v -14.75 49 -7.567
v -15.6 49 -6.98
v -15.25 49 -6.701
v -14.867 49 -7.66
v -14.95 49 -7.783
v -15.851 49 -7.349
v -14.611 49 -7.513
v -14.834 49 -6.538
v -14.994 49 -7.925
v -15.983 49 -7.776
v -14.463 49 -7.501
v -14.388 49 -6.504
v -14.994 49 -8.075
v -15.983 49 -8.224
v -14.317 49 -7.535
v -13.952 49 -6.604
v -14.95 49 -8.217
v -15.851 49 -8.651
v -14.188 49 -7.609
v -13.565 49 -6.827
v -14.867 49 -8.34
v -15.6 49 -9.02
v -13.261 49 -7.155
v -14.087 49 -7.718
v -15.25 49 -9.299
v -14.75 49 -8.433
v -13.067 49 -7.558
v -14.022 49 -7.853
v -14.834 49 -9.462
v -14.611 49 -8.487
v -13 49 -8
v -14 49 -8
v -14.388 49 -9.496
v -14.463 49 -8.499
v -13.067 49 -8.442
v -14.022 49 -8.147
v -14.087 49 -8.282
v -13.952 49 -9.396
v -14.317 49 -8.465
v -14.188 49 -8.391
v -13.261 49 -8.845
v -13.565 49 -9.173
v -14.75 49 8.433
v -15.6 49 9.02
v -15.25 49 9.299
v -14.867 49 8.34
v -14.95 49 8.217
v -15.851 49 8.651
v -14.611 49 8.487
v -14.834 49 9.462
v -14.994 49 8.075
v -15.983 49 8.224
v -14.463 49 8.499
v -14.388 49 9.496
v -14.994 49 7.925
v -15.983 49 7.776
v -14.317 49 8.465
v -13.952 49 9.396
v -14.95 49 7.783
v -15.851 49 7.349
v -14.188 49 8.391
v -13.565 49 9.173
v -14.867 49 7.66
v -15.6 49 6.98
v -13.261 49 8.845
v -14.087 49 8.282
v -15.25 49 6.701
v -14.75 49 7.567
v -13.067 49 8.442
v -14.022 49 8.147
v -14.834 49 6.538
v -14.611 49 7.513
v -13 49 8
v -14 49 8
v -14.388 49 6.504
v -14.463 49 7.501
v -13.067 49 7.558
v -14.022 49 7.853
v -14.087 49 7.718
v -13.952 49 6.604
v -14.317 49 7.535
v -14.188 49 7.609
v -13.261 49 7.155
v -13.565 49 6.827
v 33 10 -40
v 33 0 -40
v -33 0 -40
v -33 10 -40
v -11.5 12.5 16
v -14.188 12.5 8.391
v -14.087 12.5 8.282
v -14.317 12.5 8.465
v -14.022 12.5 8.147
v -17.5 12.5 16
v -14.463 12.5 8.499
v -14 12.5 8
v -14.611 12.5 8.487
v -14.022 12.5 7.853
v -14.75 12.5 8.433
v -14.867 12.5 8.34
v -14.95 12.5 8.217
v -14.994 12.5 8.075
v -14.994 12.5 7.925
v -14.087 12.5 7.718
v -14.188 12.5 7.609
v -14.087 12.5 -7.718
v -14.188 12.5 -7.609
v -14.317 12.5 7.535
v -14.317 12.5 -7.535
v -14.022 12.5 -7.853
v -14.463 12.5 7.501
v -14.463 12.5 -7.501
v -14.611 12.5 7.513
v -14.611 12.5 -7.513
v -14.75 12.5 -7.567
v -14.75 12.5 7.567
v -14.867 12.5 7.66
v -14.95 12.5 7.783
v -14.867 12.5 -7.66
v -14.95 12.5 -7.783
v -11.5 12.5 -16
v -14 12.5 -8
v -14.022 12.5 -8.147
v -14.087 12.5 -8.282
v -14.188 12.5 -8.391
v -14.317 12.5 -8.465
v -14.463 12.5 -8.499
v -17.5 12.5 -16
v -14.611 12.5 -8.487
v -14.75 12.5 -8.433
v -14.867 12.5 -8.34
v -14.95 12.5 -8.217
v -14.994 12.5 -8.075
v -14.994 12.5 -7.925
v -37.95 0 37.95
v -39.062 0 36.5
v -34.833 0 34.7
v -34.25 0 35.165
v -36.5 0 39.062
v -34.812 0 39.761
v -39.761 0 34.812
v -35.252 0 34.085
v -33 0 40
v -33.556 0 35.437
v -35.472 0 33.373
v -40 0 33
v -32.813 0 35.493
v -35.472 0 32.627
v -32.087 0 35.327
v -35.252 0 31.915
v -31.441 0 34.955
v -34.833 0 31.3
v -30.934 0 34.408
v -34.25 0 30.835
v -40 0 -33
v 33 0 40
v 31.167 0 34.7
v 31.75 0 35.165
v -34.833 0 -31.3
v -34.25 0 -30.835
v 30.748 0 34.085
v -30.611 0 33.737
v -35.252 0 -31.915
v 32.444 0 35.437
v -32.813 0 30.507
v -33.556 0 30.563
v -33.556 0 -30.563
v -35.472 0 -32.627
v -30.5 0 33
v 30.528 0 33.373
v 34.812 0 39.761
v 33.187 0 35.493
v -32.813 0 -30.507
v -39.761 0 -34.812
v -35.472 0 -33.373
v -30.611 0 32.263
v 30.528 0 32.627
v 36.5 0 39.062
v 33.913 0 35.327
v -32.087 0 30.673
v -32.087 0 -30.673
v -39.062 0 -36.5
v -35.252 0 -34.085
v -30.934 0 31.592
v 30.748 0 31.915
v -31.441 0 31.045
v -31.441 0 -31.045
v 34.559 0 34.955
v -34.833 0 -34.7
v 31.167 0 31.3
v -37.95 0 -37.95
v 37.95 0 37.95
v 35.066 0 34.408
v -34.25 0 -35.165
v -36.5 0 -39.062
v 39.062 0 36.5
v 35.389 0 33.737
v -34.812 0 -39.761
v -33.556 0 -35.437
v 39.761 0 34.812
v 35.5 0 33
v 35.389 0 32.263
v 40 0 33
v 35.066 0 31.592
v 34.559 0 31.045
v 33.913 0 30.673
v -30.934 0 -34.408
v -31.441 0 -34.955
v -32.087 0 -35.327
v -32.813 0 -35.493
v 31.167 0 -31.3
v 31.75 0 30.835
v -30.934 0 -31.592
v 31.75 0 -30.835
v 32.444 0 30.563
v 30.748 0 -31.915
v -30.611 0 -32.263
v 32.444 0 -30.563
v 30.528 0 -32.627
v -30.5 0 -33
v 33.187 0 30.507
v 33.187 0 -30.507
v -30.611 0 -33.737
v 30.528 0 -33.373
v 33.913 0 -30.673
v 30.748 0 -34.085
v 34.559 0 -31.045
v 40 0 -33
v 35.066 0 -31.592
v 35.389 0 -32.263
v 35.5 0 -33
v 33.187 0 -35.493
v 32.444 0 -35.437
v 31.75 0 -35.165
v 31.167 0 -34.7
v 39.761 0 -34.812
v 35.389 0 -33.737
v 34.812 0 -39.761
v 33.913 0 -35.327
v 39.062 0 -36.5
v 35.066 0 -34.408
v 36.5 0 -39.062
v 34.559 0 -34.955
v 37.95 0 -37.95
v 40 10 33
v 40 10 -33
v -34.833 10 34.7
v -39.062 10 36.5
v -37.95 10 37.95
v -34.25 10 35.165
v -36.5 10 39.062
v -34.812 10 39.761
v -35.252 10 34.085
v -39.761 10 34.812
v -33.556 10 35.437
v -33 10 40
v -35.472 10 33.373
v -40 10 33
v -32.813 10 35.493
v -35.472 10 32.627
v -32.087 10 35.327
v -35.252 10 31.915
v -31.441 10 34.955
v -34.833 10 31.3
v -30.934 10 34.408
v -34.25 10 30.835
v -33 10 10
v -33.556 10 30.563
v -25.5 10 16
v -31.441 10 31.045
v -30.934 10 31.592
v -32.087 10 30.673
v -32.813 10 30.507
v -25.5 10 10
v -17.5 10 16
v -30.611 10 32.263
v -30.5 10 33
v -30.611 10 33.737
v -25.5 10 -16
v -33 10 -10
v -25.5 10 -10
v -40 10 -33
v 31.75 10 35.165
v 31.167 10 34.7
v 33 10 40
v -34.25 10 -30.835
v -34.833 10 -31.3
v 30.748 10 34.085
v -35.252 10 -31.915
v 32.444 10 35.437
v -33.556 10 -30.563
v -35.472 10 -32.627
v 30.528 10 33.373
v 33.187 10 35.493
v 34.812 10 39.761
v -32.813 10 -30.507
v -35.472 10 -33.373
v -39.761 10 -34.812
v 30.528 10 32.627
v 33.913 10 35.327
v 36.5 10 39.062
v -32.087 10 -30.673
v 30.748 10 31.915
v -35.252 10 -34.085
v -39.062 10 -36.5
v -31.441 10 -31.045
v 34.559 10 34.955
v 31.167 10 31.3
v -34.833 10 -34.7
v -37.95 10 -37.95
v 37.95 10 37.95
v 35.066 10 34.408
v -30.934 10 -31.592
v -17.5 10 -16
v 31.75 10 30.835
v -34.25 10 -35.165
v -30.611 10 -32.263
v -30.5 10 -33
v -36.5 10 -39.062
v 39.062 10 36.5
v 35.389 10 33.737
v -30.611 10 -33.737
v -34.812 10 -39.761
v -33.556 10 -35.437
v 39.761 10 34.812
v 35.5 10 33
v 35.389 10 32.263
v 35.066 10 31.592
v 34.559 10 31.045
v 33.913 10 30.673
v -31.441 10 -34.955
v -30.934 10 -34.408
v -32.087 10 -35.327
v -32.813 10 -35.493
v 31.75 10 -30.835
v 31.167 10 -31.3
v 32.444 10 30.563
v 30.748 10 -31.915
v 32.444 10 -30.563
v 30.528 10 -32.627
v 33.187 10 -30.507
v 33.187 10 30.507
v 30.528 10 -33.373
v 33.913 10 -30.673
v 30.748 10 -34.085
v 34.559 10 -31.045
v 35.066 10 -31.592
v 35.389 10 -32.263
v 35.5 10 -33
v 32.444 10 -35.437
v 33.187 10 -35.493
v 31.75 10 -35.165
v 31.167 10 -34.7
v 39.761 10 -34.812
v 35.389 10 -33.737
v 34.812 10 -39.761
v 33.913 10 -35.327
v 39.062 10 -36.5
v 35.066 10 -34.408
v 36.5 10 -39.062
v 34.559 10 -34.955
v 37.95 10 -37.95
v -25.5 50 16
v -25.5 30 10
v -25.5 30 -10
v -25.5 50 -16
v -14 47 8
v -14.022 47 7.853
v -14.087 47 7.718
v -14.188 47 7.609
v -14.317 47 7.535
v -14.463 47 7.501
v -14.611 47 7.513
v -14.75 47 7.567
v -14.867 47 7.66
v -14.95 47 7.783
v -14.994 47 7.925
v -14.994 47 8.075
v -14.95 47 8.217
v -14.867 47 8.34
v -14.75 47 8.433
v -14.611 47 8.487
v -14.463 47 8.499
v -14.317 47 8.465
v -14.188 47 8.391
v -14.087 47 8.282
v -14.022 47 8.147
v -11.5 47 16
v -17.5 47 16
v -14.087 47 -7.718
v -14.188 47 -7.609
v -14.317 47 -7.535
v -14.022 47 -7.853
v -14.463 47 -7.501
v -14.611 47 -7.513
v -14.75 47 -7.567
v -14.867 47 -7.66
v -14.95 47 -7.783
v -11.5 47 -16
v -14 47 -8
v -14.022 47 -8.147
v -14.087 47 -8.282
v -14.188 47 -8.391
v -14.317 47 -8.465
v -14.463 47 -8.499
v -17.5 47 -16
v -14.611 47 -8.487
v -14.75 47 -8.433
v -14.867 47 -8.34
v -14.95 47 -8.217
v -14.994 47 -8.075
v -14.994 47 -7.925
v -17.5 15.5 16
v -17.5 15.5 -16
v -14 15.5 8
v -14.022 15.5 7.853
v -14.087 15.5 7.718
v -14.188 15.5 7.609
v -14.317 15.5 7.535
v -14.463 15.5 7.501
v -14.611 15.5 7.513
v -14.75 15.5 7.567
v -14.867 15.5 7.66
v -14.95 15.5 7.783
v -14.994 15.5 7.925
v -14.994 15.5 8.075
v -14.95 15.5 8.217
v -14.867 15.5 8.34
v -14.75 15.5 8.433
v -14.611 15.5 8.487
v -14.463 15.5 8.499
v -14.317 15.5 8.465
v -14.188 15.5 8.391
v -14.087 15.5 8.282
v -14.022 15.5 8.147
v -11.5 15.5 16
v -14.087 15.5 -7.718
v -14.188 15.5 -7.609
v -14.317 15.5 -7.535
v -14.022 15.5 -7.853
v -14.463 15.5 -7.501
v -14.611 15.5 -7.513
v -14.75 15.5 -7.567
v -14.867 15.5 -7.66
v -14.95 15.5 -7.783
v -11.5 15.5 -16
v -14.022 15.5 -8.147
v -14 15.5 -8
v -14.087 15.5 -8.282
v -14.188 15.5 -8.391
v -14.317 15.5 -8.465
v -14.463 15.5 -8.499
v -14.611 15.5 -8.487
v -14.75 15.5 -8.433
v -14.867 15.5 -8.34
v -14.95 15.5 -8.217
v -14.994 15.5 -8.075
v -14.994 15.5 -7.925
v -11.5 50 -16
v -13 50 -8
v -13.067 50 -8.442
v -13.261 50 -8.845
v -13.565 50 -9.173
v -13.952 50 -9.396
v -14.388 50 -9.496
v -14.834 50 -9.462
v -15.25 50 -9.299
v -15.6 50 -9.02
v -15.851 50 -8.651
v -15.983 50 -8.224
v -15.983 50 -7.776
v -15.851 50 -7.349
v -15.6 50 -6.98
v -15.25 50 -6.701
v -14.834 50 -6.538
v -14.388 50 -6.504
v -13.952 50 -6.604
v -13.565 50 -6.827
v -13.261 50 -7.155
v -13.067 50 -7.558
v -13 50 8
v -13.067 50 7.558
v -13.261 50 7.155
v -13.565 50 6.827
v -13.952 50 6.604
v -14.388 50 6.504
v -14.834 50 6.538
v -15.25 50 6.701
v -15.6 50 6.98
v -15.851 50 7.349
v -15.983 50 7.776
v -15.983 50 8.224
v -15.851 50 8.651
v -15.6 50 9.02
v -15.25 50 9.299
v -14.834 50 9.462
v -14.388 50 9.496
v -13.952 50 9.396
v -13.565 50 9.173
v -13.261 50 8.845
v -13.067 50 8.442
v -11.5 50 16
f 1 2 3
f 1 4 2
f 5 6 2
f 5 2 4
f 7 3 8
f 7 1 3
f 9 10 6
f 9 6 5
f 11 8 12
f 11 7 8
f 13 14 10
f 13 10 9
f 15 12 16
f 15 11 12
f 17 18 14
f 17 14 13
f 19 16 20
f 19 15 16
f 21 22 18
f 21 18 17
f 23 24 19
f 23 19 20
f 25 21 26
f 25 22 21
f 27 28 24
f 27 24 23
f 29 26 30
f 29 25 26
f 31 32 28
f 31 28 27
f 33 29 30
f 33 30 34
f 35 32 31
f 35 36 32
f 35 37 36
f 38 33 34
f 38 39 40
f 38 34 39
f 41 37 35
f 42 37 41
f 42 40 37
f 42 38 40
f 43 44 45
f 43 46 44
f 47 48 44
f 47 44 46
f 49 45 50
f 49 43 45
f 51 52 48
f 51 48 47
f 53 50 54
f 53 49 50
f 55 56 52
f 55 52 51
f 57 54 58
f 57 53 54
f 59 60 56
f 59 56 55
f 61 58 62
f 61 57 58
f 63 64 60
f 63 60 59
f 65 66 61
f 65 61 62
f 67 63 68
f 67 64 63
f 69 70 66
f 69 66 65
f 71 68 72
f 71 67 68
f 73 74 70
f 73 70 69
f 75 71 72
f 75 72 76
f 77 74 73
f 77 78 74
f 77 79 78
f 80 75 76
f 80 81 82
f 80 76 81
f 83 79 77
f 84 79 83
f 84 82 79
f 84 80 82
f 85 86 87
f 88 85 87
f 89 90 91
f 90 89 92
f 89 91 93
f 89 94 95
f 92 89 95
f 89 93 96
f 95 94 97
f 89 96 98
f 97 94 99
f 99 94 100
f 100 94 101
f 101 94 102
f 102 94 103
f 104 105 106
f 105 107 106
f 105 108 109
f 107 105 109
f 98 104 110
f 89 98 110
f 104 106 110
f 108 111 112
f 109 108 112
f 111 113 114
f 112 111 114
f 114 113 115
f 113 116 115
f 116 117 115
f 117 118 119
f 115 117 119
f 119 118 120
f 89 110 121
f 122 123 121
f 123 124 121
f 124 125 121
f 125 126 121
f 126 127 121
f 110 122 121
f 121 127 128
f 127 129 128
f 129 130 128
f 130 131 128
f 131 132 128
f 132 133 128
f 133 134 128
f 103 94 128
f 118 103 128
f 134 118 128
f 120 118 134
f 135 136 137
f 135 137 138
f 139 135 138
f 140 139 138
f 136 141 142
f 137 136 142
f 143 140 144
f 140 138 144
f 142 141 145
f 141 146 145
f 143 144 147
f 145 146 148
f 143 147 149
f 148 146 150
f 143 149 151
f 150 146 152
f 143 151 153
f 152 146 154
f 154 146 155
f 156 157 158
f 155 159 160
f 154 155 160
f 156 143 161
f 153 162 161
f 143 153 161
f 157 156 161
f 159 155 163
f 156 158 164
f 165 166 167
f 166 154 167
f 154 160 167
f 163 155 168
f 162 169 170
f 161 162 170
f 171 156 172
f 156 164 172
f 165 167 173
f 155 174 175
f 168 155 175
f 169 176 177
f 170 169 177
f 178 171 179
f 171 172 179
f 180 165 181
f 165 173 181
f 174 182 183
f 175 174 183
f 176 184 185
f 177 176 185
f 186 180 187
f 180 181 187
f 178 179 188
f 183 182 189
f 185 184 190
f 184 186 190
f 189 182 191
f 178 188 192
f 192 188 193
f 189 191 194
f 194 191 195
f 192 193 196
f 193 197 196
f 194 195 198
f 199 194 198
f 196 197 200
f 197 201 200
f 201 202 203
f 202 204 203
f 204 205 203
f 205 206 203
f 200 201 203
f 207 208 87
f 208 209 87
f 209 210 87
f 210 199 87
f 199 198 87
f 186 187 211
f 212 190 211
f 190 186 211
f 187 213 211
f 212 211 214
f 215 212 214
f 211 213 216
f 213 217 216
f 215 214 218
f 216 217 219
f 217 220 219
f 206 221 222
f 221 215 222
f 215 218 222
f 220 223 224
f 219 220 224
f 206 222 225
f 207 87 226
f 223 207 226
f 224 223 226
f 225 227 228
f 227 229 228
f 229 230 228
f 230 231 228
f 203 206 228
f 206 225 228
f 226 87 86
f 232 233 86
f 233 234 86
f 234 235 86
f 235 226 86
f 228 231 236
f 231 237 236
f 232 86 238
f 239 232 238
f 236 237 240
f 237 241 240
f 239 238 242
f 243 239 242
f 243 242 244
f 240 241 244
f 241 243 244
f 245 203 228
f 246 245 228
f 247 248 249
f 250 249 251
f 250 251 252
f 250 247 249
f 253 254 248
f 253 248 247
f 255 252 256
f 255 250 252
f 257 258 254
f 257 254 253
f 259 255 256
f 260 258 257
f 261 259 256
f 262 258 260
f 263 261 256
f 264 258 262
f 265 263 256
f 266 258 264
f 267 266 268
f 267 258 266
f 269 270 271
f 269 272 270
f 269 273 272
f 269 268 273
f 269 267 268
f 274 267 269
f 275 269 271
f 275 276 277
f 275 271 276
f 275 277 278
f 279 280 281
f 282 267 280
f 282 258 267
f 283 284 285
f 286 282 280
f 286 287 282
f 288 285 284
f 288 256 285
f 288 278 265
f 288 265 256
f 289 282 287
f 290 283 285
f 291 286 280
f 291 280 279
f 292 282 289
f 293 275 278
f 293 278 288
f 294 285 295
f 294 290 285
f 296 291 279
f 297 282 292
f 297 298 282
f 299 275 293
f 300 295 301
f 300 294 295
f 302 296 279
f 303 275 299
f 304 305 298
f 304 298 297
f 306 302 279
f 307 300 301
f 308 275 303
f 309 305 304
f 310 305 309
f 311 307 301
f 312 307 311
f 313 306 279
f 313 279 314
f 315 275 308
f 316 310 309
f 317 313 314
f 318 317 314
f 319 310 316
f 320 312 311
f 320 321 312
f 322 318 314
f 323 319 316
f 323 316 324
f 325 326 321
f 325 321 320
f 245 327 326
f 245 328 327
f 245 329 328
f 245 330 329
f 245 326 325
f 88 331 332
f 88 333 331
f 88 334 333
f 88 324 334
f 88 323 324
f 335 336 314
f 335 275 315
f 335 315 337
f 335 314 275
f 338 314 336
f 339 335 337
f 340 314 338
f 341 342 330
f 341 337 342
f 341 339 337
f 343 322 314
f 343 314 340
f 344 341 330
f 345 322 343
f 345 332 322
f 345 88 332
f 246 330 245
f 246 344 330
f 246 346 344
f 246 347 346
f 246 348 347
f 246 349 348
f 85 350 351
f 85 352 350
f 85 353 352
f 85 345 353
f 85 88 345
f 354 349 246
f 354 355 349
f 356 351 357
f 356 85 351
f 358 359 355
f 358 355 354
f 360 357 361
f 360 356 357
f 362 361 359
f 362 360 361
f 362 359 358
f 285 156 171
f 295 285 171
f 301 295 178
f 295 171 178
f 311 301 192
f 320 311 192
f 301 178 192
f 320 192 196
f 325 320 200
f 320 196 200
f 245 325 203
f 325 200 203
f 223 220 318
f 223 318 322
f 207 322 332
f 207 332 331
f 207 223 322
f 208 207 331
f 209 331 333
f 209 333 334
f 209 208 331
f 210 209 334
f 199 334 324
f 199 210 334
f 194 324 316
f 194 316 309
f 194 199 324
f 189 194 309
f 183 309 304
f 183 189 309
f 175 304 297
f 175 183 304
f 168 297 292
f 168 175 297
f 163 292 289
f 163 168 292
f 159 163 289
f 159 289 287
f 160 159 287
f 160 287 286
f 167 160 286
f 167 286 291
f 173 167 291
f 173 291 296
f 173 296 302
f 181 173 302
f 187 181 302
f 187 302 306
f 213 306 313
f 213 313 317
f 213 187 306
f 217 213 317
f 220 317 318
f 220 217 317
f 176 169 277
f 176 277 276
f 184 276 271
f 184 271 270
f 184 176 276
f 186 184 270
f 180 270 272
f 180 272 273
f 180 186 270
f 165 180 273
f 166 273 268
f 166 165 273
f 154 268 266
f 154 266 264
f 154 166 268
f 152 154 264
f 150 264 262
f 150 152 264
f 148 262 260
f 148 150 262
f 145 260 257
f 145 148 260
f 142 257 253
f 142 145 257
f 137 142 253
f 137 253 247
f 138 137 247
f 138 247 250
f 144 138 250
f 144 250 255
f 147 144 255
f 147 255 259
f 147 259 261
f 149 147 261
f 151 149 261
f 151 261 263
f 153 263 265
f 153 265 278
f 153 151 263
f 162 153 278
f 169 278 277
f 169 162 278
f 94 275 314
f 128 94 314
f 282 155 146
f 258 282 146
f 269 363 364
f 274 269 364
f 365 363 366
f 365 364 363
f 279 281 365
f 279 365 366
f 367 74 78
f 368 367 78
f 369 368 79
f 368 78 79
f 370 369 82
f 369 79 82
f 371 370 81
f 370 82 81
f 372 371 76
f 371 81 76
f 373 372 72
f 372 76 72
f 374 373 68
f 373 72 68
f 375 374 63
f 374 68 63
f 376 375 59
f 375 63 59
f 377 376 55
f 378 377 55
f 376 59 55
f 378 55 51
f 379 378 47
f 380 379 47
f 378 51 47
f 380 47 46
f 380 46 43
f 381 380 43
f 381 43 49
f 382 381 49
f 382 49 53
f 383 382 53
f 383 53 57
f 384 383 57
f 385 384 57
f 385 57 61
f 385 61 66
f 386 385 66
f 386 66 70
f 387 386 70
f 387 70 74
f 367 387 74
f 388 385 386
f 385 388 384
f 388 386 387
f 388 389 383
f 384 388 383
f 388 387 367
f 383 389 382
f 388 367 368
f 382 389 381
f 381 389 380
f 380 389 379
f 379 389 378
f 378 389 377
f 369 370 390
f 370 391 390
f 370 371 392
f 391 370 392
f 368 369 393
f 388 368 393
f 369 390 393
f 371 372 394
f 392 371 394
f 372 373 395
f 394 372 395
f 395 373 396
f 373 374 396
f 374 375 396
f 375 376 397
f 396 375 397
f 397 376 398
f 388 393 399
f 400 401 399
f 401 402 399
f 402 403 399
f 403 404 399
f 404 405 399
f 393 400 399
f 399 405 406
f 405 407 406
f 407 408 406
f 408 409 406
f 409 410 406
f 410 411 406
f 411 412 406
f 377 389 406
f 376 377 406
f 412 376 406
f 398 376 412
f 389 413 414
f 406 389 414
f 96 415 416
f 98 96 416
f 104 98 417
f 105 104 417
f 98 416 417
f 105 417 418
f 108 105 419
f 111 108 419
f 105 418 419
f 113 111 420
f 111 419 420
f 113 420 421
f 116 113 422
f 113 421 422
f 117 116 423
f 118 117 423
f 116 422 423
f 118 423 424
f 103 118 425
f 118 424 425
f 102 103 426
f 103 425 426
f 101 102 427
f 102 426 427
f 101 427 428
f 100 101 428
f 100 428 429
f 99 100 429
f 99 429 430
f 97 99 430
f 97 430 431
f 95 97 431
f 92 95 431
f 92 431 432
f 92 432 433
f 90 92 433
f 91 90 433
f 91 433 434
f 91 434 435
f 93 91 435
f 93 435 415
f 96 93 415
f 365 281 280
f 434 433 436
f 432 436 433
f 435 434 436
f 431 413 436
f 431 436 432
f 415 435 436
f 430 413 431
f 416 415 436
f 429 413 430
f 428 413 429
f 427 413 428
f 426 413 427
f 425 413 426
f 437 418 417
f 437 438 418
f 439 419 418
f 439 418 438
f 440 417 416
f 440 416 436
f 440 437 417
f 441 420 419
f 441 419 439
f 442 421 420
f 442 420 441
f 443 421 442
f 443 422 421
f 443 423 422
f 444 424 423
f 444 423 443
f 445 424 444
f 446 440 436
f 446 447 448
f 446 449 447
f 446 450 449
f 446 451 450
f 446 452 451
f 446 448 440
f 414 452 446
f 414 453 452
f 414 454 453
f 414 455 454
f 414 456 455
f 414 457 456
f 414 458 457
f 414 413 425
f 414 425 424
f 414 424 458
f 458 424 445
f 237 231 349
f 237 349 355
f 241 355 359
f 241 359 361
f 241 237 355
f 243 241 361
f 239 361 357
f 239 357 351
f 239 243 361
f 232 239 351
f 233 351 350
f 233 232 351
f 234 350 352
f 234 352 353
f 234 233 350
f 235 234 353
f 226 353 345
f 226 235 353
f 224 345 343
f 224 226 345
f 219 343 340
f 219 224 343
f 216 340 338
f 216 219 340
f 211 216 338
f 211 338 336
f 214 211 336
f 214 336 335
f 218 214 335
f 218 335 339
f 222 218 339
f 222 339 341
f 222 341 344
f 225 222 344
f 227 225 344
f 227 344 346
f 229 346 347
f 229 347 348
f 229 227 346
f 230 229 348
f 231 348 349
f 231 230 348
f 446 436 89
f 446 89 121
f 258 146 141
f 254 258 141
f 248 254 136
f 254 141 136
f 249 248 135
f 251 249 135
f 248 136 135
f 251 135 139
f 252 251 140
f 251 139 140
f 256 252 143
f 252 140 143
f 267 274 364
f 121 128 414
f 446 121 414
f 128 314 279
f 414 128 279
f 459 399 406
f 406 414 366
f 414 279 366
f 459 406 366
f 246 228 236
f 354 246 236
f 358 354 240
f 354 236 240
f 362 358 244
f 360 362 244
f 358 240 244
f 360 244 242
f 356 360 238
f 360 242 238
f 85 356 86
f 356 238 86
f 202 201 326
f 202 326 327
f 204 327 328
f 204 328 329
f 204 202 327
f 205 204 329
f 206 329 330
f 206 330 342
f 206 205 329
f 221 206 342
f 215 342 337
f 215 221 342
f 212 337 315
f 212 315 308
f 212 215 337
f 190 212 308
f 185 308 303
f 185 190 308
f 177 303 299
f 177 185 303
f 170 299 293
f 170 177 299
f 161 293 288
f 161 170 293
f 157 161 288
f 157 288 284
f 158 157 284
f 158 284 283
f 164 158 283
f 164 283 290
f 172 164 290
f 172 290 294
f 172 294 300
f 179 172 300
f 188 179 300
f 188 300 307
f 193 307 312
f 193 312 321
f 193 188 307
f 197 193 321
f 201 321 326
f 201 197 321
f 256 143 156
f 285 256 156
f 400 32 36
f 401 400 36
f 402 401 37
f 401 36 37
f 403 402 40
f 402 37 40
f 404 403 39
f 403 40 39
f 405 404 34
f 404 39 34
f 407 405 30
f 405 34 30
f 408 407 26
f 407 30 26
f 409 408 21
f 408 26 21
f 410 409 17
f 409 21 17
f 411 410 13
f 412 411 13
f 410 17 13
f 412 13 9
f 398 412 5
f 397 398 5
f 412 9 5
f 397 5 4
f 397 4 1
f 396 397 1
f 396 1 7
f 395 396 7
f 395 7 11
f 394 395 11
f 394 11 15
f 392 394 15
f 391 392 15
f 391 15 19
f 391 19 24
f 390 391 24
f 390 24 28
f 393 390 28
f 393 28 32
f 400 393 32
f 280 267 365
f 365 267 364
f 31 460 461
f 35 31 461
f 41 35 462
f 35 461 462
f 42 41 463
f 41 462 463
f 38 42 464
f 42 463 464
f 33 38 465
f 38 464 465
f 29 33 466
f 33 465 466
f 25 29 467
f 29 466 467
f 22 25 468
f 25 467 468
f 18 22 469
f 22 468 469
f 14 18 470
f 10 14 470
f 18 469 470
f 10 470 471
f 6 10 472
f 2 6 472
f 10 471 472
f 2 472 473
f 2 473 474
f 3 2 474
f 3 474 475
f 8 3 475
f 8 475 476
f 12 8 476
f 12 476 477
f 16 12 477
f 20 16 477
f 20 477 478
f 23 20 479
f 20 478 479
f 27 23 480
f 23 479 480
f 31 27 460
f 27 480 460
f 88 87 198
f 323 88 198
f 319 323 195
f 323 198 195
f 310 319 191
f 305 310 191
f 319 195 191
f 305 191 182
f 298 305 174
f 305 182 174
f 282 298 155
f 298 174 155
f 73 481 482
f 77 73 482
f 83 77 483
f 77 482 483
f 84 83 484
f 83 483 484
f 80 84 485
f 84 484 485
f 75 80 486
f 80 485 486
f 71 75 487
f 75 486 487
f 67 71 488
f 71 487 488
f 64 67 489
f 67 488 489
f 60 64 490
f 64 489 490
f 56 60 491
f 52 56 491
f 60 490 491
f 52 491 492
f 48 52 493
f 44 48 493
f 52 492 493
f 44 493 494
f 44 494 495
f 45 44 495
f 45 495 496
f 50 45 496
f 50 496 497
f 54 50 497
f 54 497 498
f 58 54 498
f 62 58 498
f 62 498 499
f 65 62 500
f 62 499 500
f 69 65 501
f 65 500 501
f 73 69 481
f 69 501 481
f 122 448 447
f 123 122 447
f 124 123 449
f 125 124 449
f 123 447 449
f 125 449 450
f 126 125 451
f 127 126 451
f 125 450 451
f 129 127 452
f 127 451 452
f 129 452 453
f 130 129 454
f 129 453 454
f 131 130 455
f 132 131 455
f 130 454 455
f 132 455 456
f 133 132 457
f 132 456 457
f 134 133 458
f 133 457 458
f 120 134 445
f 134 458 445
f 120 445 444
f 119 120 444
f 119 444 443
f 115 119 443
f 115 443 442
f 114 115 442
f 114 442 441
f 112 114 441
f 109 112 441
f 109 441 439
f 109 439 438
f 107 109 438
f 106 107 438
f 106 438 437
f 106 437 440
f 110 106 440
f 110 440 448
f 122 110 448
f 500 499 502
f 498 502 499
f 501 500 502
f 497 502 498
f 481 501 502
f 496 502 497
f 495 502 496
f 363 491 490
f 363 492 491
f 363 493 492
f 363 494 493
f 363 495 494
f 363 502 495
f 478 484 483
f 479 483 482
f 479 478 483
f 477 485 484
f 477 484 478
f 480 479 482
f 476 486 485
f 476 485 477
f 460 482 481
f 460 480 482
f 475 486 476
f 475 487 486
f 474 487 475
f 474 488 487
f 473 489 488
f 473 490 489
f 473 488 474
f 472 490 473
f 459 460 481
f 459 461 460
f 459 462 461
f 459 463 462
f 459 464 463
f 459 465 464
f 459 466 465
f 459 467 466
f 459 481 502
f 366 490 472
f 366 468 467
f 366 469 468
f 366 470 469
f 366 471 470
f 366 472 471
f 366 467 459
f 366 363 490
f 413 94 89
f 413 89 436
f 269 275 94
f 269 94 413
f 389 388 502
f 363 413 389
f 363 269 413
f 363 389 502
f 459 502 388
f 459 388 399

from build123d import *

# Parameters (mm, degrees)
SKETCH1_R           = 2.5
BOSS_EXTRUDE1_DEPTH = 10
SKETCH5_W           = 8
SKETCH5_H           = 32
BOSS_EXTRUDE4_DEPTH = 40
BOSS_EXTRUDE5_DEPTH = 10
SKETCH7_W           = 32
SKETCH7_H           = 3
BOSS_EXTRUDE6_DEPTH = 6
SKETCH8_R           = 0.5
CUT_EXTRUDE1_DEPTH  = 39
SKETCH9_R           = 1.5
CUT_EXTRUDE2_DEPTH  = 1


with BuildPart() as part:
    # Sketch1 → Boss-Extrude1 (new body)
    with BuildSketch(Plane(origin=(0, 0, 0), x_dir=(1, 0, 0), z_dir=(0, 1, 0))):
        with BuildLine():
            Line((-33, -40), (33, -40))
            ThreePointArc((33, -40), (37.949747468, -37.949747468), (40, -33))
            Line((40, -33), (40, 33))
            ThreePointArc((40, 33), (37.949747468, 37.949747468), (33, 40))
            Line((33, 40), (-33, 40))
            ThreePointArc((-33, 40), (-37.949747468, 37.949747468), (-40, 33))
            Line((-40, 33), (-40, -33))
            ThreePointArc((-40, -33), (-37.949747468, -37.949747468), (-33, -40))
        make_face()
        with Locations((33, -33)):
            Circle(SKETCH1_R, mode=Mode.SUBTRACT)
        with Locations((-33, -33)):
            Circle(SKETCH1_R, mode=Mode.SUBTRACT)
        with Locations((33, 33)):
            Circle(SKETCH1_R, mode=Mode.SUBTRACT)
        with Locations((-33, 33)):
            Circle(SKETCH1_R, mode=Mode.SUBTRACT)
    extrude(amount=BOSS_EXTRUDE1_DEPTH)

    # Sketch5 → Boss-Extrude4 (add)
    with BuildSketch(Plane(origin=(0, 10, 0), x_dir=(1, 0, 0), z_dir=(0, 1, 0))):
        with Locations((-21.5, 0)):
            Rectangle(SKETCH5_W, SKETCH5_H)
    extrude(amount=BOSS_EXTRUDE4_DEPTH)

    # Sketch6 → Boss-Extrude5 (add, symmetric)
    with BuildSketch(Plane.XY):
        Polygon((-33, 10), (-25.5, 30), (-25.5, 10), align=None)
    extrude(amount=BOSS_EXTRUDE5_DEPTH, both=True)

    # Sketch7 → Boss-Extrude6 (add)
    with BuildSketch(Plane(origin=(-17.5, 0, 0), x_dir=(0, 0, -1), z_dir=(1, 0, 0))):
        with Locations((0, 48.5)):
            Rectangle(SKETCH7_W, SKETCH7_H)
        with Locations((0, 14)):
            Rectangle(SKETCH7_W, SKETCH7_H)
    extrude(amount=BOSS_EXTRUDE6_DEPTH)

    # Sketch8 → Cut-Extrude1 (cut)
    with BuildSketch(Plane(origin=(0, 50, 0), x_dir=(1, 0, 0), z_dir=(0, 1, 0))):
        with Locations((-14.5, -8)):
            Circle(SKETCH8_R)
        with Locations((-14.5, 8)):
            Circle(SKETCH8_R)
    extrude(amount=-CUT_EXTRUDE1_DEPTH, mode=Mode.SUBTRACT)

    # Sketch9 → Cut-Extrude2 (cut)
    with BuildSketch(Plane(origin=(0, 50, 0), x_dir=(1, 0, 0), z_dir=(0, 1, 0))):
        with Locations((-14.5, 8)):
            Circle(SKETCH9_R)
        with Locations((-14.5, -8)):
            Circle(SKETCH9_R)
    extrude(amount=-CUT_EXTRUDE2_DEPTH, mode=Mode.SUBTRACT)


solid = part.part
